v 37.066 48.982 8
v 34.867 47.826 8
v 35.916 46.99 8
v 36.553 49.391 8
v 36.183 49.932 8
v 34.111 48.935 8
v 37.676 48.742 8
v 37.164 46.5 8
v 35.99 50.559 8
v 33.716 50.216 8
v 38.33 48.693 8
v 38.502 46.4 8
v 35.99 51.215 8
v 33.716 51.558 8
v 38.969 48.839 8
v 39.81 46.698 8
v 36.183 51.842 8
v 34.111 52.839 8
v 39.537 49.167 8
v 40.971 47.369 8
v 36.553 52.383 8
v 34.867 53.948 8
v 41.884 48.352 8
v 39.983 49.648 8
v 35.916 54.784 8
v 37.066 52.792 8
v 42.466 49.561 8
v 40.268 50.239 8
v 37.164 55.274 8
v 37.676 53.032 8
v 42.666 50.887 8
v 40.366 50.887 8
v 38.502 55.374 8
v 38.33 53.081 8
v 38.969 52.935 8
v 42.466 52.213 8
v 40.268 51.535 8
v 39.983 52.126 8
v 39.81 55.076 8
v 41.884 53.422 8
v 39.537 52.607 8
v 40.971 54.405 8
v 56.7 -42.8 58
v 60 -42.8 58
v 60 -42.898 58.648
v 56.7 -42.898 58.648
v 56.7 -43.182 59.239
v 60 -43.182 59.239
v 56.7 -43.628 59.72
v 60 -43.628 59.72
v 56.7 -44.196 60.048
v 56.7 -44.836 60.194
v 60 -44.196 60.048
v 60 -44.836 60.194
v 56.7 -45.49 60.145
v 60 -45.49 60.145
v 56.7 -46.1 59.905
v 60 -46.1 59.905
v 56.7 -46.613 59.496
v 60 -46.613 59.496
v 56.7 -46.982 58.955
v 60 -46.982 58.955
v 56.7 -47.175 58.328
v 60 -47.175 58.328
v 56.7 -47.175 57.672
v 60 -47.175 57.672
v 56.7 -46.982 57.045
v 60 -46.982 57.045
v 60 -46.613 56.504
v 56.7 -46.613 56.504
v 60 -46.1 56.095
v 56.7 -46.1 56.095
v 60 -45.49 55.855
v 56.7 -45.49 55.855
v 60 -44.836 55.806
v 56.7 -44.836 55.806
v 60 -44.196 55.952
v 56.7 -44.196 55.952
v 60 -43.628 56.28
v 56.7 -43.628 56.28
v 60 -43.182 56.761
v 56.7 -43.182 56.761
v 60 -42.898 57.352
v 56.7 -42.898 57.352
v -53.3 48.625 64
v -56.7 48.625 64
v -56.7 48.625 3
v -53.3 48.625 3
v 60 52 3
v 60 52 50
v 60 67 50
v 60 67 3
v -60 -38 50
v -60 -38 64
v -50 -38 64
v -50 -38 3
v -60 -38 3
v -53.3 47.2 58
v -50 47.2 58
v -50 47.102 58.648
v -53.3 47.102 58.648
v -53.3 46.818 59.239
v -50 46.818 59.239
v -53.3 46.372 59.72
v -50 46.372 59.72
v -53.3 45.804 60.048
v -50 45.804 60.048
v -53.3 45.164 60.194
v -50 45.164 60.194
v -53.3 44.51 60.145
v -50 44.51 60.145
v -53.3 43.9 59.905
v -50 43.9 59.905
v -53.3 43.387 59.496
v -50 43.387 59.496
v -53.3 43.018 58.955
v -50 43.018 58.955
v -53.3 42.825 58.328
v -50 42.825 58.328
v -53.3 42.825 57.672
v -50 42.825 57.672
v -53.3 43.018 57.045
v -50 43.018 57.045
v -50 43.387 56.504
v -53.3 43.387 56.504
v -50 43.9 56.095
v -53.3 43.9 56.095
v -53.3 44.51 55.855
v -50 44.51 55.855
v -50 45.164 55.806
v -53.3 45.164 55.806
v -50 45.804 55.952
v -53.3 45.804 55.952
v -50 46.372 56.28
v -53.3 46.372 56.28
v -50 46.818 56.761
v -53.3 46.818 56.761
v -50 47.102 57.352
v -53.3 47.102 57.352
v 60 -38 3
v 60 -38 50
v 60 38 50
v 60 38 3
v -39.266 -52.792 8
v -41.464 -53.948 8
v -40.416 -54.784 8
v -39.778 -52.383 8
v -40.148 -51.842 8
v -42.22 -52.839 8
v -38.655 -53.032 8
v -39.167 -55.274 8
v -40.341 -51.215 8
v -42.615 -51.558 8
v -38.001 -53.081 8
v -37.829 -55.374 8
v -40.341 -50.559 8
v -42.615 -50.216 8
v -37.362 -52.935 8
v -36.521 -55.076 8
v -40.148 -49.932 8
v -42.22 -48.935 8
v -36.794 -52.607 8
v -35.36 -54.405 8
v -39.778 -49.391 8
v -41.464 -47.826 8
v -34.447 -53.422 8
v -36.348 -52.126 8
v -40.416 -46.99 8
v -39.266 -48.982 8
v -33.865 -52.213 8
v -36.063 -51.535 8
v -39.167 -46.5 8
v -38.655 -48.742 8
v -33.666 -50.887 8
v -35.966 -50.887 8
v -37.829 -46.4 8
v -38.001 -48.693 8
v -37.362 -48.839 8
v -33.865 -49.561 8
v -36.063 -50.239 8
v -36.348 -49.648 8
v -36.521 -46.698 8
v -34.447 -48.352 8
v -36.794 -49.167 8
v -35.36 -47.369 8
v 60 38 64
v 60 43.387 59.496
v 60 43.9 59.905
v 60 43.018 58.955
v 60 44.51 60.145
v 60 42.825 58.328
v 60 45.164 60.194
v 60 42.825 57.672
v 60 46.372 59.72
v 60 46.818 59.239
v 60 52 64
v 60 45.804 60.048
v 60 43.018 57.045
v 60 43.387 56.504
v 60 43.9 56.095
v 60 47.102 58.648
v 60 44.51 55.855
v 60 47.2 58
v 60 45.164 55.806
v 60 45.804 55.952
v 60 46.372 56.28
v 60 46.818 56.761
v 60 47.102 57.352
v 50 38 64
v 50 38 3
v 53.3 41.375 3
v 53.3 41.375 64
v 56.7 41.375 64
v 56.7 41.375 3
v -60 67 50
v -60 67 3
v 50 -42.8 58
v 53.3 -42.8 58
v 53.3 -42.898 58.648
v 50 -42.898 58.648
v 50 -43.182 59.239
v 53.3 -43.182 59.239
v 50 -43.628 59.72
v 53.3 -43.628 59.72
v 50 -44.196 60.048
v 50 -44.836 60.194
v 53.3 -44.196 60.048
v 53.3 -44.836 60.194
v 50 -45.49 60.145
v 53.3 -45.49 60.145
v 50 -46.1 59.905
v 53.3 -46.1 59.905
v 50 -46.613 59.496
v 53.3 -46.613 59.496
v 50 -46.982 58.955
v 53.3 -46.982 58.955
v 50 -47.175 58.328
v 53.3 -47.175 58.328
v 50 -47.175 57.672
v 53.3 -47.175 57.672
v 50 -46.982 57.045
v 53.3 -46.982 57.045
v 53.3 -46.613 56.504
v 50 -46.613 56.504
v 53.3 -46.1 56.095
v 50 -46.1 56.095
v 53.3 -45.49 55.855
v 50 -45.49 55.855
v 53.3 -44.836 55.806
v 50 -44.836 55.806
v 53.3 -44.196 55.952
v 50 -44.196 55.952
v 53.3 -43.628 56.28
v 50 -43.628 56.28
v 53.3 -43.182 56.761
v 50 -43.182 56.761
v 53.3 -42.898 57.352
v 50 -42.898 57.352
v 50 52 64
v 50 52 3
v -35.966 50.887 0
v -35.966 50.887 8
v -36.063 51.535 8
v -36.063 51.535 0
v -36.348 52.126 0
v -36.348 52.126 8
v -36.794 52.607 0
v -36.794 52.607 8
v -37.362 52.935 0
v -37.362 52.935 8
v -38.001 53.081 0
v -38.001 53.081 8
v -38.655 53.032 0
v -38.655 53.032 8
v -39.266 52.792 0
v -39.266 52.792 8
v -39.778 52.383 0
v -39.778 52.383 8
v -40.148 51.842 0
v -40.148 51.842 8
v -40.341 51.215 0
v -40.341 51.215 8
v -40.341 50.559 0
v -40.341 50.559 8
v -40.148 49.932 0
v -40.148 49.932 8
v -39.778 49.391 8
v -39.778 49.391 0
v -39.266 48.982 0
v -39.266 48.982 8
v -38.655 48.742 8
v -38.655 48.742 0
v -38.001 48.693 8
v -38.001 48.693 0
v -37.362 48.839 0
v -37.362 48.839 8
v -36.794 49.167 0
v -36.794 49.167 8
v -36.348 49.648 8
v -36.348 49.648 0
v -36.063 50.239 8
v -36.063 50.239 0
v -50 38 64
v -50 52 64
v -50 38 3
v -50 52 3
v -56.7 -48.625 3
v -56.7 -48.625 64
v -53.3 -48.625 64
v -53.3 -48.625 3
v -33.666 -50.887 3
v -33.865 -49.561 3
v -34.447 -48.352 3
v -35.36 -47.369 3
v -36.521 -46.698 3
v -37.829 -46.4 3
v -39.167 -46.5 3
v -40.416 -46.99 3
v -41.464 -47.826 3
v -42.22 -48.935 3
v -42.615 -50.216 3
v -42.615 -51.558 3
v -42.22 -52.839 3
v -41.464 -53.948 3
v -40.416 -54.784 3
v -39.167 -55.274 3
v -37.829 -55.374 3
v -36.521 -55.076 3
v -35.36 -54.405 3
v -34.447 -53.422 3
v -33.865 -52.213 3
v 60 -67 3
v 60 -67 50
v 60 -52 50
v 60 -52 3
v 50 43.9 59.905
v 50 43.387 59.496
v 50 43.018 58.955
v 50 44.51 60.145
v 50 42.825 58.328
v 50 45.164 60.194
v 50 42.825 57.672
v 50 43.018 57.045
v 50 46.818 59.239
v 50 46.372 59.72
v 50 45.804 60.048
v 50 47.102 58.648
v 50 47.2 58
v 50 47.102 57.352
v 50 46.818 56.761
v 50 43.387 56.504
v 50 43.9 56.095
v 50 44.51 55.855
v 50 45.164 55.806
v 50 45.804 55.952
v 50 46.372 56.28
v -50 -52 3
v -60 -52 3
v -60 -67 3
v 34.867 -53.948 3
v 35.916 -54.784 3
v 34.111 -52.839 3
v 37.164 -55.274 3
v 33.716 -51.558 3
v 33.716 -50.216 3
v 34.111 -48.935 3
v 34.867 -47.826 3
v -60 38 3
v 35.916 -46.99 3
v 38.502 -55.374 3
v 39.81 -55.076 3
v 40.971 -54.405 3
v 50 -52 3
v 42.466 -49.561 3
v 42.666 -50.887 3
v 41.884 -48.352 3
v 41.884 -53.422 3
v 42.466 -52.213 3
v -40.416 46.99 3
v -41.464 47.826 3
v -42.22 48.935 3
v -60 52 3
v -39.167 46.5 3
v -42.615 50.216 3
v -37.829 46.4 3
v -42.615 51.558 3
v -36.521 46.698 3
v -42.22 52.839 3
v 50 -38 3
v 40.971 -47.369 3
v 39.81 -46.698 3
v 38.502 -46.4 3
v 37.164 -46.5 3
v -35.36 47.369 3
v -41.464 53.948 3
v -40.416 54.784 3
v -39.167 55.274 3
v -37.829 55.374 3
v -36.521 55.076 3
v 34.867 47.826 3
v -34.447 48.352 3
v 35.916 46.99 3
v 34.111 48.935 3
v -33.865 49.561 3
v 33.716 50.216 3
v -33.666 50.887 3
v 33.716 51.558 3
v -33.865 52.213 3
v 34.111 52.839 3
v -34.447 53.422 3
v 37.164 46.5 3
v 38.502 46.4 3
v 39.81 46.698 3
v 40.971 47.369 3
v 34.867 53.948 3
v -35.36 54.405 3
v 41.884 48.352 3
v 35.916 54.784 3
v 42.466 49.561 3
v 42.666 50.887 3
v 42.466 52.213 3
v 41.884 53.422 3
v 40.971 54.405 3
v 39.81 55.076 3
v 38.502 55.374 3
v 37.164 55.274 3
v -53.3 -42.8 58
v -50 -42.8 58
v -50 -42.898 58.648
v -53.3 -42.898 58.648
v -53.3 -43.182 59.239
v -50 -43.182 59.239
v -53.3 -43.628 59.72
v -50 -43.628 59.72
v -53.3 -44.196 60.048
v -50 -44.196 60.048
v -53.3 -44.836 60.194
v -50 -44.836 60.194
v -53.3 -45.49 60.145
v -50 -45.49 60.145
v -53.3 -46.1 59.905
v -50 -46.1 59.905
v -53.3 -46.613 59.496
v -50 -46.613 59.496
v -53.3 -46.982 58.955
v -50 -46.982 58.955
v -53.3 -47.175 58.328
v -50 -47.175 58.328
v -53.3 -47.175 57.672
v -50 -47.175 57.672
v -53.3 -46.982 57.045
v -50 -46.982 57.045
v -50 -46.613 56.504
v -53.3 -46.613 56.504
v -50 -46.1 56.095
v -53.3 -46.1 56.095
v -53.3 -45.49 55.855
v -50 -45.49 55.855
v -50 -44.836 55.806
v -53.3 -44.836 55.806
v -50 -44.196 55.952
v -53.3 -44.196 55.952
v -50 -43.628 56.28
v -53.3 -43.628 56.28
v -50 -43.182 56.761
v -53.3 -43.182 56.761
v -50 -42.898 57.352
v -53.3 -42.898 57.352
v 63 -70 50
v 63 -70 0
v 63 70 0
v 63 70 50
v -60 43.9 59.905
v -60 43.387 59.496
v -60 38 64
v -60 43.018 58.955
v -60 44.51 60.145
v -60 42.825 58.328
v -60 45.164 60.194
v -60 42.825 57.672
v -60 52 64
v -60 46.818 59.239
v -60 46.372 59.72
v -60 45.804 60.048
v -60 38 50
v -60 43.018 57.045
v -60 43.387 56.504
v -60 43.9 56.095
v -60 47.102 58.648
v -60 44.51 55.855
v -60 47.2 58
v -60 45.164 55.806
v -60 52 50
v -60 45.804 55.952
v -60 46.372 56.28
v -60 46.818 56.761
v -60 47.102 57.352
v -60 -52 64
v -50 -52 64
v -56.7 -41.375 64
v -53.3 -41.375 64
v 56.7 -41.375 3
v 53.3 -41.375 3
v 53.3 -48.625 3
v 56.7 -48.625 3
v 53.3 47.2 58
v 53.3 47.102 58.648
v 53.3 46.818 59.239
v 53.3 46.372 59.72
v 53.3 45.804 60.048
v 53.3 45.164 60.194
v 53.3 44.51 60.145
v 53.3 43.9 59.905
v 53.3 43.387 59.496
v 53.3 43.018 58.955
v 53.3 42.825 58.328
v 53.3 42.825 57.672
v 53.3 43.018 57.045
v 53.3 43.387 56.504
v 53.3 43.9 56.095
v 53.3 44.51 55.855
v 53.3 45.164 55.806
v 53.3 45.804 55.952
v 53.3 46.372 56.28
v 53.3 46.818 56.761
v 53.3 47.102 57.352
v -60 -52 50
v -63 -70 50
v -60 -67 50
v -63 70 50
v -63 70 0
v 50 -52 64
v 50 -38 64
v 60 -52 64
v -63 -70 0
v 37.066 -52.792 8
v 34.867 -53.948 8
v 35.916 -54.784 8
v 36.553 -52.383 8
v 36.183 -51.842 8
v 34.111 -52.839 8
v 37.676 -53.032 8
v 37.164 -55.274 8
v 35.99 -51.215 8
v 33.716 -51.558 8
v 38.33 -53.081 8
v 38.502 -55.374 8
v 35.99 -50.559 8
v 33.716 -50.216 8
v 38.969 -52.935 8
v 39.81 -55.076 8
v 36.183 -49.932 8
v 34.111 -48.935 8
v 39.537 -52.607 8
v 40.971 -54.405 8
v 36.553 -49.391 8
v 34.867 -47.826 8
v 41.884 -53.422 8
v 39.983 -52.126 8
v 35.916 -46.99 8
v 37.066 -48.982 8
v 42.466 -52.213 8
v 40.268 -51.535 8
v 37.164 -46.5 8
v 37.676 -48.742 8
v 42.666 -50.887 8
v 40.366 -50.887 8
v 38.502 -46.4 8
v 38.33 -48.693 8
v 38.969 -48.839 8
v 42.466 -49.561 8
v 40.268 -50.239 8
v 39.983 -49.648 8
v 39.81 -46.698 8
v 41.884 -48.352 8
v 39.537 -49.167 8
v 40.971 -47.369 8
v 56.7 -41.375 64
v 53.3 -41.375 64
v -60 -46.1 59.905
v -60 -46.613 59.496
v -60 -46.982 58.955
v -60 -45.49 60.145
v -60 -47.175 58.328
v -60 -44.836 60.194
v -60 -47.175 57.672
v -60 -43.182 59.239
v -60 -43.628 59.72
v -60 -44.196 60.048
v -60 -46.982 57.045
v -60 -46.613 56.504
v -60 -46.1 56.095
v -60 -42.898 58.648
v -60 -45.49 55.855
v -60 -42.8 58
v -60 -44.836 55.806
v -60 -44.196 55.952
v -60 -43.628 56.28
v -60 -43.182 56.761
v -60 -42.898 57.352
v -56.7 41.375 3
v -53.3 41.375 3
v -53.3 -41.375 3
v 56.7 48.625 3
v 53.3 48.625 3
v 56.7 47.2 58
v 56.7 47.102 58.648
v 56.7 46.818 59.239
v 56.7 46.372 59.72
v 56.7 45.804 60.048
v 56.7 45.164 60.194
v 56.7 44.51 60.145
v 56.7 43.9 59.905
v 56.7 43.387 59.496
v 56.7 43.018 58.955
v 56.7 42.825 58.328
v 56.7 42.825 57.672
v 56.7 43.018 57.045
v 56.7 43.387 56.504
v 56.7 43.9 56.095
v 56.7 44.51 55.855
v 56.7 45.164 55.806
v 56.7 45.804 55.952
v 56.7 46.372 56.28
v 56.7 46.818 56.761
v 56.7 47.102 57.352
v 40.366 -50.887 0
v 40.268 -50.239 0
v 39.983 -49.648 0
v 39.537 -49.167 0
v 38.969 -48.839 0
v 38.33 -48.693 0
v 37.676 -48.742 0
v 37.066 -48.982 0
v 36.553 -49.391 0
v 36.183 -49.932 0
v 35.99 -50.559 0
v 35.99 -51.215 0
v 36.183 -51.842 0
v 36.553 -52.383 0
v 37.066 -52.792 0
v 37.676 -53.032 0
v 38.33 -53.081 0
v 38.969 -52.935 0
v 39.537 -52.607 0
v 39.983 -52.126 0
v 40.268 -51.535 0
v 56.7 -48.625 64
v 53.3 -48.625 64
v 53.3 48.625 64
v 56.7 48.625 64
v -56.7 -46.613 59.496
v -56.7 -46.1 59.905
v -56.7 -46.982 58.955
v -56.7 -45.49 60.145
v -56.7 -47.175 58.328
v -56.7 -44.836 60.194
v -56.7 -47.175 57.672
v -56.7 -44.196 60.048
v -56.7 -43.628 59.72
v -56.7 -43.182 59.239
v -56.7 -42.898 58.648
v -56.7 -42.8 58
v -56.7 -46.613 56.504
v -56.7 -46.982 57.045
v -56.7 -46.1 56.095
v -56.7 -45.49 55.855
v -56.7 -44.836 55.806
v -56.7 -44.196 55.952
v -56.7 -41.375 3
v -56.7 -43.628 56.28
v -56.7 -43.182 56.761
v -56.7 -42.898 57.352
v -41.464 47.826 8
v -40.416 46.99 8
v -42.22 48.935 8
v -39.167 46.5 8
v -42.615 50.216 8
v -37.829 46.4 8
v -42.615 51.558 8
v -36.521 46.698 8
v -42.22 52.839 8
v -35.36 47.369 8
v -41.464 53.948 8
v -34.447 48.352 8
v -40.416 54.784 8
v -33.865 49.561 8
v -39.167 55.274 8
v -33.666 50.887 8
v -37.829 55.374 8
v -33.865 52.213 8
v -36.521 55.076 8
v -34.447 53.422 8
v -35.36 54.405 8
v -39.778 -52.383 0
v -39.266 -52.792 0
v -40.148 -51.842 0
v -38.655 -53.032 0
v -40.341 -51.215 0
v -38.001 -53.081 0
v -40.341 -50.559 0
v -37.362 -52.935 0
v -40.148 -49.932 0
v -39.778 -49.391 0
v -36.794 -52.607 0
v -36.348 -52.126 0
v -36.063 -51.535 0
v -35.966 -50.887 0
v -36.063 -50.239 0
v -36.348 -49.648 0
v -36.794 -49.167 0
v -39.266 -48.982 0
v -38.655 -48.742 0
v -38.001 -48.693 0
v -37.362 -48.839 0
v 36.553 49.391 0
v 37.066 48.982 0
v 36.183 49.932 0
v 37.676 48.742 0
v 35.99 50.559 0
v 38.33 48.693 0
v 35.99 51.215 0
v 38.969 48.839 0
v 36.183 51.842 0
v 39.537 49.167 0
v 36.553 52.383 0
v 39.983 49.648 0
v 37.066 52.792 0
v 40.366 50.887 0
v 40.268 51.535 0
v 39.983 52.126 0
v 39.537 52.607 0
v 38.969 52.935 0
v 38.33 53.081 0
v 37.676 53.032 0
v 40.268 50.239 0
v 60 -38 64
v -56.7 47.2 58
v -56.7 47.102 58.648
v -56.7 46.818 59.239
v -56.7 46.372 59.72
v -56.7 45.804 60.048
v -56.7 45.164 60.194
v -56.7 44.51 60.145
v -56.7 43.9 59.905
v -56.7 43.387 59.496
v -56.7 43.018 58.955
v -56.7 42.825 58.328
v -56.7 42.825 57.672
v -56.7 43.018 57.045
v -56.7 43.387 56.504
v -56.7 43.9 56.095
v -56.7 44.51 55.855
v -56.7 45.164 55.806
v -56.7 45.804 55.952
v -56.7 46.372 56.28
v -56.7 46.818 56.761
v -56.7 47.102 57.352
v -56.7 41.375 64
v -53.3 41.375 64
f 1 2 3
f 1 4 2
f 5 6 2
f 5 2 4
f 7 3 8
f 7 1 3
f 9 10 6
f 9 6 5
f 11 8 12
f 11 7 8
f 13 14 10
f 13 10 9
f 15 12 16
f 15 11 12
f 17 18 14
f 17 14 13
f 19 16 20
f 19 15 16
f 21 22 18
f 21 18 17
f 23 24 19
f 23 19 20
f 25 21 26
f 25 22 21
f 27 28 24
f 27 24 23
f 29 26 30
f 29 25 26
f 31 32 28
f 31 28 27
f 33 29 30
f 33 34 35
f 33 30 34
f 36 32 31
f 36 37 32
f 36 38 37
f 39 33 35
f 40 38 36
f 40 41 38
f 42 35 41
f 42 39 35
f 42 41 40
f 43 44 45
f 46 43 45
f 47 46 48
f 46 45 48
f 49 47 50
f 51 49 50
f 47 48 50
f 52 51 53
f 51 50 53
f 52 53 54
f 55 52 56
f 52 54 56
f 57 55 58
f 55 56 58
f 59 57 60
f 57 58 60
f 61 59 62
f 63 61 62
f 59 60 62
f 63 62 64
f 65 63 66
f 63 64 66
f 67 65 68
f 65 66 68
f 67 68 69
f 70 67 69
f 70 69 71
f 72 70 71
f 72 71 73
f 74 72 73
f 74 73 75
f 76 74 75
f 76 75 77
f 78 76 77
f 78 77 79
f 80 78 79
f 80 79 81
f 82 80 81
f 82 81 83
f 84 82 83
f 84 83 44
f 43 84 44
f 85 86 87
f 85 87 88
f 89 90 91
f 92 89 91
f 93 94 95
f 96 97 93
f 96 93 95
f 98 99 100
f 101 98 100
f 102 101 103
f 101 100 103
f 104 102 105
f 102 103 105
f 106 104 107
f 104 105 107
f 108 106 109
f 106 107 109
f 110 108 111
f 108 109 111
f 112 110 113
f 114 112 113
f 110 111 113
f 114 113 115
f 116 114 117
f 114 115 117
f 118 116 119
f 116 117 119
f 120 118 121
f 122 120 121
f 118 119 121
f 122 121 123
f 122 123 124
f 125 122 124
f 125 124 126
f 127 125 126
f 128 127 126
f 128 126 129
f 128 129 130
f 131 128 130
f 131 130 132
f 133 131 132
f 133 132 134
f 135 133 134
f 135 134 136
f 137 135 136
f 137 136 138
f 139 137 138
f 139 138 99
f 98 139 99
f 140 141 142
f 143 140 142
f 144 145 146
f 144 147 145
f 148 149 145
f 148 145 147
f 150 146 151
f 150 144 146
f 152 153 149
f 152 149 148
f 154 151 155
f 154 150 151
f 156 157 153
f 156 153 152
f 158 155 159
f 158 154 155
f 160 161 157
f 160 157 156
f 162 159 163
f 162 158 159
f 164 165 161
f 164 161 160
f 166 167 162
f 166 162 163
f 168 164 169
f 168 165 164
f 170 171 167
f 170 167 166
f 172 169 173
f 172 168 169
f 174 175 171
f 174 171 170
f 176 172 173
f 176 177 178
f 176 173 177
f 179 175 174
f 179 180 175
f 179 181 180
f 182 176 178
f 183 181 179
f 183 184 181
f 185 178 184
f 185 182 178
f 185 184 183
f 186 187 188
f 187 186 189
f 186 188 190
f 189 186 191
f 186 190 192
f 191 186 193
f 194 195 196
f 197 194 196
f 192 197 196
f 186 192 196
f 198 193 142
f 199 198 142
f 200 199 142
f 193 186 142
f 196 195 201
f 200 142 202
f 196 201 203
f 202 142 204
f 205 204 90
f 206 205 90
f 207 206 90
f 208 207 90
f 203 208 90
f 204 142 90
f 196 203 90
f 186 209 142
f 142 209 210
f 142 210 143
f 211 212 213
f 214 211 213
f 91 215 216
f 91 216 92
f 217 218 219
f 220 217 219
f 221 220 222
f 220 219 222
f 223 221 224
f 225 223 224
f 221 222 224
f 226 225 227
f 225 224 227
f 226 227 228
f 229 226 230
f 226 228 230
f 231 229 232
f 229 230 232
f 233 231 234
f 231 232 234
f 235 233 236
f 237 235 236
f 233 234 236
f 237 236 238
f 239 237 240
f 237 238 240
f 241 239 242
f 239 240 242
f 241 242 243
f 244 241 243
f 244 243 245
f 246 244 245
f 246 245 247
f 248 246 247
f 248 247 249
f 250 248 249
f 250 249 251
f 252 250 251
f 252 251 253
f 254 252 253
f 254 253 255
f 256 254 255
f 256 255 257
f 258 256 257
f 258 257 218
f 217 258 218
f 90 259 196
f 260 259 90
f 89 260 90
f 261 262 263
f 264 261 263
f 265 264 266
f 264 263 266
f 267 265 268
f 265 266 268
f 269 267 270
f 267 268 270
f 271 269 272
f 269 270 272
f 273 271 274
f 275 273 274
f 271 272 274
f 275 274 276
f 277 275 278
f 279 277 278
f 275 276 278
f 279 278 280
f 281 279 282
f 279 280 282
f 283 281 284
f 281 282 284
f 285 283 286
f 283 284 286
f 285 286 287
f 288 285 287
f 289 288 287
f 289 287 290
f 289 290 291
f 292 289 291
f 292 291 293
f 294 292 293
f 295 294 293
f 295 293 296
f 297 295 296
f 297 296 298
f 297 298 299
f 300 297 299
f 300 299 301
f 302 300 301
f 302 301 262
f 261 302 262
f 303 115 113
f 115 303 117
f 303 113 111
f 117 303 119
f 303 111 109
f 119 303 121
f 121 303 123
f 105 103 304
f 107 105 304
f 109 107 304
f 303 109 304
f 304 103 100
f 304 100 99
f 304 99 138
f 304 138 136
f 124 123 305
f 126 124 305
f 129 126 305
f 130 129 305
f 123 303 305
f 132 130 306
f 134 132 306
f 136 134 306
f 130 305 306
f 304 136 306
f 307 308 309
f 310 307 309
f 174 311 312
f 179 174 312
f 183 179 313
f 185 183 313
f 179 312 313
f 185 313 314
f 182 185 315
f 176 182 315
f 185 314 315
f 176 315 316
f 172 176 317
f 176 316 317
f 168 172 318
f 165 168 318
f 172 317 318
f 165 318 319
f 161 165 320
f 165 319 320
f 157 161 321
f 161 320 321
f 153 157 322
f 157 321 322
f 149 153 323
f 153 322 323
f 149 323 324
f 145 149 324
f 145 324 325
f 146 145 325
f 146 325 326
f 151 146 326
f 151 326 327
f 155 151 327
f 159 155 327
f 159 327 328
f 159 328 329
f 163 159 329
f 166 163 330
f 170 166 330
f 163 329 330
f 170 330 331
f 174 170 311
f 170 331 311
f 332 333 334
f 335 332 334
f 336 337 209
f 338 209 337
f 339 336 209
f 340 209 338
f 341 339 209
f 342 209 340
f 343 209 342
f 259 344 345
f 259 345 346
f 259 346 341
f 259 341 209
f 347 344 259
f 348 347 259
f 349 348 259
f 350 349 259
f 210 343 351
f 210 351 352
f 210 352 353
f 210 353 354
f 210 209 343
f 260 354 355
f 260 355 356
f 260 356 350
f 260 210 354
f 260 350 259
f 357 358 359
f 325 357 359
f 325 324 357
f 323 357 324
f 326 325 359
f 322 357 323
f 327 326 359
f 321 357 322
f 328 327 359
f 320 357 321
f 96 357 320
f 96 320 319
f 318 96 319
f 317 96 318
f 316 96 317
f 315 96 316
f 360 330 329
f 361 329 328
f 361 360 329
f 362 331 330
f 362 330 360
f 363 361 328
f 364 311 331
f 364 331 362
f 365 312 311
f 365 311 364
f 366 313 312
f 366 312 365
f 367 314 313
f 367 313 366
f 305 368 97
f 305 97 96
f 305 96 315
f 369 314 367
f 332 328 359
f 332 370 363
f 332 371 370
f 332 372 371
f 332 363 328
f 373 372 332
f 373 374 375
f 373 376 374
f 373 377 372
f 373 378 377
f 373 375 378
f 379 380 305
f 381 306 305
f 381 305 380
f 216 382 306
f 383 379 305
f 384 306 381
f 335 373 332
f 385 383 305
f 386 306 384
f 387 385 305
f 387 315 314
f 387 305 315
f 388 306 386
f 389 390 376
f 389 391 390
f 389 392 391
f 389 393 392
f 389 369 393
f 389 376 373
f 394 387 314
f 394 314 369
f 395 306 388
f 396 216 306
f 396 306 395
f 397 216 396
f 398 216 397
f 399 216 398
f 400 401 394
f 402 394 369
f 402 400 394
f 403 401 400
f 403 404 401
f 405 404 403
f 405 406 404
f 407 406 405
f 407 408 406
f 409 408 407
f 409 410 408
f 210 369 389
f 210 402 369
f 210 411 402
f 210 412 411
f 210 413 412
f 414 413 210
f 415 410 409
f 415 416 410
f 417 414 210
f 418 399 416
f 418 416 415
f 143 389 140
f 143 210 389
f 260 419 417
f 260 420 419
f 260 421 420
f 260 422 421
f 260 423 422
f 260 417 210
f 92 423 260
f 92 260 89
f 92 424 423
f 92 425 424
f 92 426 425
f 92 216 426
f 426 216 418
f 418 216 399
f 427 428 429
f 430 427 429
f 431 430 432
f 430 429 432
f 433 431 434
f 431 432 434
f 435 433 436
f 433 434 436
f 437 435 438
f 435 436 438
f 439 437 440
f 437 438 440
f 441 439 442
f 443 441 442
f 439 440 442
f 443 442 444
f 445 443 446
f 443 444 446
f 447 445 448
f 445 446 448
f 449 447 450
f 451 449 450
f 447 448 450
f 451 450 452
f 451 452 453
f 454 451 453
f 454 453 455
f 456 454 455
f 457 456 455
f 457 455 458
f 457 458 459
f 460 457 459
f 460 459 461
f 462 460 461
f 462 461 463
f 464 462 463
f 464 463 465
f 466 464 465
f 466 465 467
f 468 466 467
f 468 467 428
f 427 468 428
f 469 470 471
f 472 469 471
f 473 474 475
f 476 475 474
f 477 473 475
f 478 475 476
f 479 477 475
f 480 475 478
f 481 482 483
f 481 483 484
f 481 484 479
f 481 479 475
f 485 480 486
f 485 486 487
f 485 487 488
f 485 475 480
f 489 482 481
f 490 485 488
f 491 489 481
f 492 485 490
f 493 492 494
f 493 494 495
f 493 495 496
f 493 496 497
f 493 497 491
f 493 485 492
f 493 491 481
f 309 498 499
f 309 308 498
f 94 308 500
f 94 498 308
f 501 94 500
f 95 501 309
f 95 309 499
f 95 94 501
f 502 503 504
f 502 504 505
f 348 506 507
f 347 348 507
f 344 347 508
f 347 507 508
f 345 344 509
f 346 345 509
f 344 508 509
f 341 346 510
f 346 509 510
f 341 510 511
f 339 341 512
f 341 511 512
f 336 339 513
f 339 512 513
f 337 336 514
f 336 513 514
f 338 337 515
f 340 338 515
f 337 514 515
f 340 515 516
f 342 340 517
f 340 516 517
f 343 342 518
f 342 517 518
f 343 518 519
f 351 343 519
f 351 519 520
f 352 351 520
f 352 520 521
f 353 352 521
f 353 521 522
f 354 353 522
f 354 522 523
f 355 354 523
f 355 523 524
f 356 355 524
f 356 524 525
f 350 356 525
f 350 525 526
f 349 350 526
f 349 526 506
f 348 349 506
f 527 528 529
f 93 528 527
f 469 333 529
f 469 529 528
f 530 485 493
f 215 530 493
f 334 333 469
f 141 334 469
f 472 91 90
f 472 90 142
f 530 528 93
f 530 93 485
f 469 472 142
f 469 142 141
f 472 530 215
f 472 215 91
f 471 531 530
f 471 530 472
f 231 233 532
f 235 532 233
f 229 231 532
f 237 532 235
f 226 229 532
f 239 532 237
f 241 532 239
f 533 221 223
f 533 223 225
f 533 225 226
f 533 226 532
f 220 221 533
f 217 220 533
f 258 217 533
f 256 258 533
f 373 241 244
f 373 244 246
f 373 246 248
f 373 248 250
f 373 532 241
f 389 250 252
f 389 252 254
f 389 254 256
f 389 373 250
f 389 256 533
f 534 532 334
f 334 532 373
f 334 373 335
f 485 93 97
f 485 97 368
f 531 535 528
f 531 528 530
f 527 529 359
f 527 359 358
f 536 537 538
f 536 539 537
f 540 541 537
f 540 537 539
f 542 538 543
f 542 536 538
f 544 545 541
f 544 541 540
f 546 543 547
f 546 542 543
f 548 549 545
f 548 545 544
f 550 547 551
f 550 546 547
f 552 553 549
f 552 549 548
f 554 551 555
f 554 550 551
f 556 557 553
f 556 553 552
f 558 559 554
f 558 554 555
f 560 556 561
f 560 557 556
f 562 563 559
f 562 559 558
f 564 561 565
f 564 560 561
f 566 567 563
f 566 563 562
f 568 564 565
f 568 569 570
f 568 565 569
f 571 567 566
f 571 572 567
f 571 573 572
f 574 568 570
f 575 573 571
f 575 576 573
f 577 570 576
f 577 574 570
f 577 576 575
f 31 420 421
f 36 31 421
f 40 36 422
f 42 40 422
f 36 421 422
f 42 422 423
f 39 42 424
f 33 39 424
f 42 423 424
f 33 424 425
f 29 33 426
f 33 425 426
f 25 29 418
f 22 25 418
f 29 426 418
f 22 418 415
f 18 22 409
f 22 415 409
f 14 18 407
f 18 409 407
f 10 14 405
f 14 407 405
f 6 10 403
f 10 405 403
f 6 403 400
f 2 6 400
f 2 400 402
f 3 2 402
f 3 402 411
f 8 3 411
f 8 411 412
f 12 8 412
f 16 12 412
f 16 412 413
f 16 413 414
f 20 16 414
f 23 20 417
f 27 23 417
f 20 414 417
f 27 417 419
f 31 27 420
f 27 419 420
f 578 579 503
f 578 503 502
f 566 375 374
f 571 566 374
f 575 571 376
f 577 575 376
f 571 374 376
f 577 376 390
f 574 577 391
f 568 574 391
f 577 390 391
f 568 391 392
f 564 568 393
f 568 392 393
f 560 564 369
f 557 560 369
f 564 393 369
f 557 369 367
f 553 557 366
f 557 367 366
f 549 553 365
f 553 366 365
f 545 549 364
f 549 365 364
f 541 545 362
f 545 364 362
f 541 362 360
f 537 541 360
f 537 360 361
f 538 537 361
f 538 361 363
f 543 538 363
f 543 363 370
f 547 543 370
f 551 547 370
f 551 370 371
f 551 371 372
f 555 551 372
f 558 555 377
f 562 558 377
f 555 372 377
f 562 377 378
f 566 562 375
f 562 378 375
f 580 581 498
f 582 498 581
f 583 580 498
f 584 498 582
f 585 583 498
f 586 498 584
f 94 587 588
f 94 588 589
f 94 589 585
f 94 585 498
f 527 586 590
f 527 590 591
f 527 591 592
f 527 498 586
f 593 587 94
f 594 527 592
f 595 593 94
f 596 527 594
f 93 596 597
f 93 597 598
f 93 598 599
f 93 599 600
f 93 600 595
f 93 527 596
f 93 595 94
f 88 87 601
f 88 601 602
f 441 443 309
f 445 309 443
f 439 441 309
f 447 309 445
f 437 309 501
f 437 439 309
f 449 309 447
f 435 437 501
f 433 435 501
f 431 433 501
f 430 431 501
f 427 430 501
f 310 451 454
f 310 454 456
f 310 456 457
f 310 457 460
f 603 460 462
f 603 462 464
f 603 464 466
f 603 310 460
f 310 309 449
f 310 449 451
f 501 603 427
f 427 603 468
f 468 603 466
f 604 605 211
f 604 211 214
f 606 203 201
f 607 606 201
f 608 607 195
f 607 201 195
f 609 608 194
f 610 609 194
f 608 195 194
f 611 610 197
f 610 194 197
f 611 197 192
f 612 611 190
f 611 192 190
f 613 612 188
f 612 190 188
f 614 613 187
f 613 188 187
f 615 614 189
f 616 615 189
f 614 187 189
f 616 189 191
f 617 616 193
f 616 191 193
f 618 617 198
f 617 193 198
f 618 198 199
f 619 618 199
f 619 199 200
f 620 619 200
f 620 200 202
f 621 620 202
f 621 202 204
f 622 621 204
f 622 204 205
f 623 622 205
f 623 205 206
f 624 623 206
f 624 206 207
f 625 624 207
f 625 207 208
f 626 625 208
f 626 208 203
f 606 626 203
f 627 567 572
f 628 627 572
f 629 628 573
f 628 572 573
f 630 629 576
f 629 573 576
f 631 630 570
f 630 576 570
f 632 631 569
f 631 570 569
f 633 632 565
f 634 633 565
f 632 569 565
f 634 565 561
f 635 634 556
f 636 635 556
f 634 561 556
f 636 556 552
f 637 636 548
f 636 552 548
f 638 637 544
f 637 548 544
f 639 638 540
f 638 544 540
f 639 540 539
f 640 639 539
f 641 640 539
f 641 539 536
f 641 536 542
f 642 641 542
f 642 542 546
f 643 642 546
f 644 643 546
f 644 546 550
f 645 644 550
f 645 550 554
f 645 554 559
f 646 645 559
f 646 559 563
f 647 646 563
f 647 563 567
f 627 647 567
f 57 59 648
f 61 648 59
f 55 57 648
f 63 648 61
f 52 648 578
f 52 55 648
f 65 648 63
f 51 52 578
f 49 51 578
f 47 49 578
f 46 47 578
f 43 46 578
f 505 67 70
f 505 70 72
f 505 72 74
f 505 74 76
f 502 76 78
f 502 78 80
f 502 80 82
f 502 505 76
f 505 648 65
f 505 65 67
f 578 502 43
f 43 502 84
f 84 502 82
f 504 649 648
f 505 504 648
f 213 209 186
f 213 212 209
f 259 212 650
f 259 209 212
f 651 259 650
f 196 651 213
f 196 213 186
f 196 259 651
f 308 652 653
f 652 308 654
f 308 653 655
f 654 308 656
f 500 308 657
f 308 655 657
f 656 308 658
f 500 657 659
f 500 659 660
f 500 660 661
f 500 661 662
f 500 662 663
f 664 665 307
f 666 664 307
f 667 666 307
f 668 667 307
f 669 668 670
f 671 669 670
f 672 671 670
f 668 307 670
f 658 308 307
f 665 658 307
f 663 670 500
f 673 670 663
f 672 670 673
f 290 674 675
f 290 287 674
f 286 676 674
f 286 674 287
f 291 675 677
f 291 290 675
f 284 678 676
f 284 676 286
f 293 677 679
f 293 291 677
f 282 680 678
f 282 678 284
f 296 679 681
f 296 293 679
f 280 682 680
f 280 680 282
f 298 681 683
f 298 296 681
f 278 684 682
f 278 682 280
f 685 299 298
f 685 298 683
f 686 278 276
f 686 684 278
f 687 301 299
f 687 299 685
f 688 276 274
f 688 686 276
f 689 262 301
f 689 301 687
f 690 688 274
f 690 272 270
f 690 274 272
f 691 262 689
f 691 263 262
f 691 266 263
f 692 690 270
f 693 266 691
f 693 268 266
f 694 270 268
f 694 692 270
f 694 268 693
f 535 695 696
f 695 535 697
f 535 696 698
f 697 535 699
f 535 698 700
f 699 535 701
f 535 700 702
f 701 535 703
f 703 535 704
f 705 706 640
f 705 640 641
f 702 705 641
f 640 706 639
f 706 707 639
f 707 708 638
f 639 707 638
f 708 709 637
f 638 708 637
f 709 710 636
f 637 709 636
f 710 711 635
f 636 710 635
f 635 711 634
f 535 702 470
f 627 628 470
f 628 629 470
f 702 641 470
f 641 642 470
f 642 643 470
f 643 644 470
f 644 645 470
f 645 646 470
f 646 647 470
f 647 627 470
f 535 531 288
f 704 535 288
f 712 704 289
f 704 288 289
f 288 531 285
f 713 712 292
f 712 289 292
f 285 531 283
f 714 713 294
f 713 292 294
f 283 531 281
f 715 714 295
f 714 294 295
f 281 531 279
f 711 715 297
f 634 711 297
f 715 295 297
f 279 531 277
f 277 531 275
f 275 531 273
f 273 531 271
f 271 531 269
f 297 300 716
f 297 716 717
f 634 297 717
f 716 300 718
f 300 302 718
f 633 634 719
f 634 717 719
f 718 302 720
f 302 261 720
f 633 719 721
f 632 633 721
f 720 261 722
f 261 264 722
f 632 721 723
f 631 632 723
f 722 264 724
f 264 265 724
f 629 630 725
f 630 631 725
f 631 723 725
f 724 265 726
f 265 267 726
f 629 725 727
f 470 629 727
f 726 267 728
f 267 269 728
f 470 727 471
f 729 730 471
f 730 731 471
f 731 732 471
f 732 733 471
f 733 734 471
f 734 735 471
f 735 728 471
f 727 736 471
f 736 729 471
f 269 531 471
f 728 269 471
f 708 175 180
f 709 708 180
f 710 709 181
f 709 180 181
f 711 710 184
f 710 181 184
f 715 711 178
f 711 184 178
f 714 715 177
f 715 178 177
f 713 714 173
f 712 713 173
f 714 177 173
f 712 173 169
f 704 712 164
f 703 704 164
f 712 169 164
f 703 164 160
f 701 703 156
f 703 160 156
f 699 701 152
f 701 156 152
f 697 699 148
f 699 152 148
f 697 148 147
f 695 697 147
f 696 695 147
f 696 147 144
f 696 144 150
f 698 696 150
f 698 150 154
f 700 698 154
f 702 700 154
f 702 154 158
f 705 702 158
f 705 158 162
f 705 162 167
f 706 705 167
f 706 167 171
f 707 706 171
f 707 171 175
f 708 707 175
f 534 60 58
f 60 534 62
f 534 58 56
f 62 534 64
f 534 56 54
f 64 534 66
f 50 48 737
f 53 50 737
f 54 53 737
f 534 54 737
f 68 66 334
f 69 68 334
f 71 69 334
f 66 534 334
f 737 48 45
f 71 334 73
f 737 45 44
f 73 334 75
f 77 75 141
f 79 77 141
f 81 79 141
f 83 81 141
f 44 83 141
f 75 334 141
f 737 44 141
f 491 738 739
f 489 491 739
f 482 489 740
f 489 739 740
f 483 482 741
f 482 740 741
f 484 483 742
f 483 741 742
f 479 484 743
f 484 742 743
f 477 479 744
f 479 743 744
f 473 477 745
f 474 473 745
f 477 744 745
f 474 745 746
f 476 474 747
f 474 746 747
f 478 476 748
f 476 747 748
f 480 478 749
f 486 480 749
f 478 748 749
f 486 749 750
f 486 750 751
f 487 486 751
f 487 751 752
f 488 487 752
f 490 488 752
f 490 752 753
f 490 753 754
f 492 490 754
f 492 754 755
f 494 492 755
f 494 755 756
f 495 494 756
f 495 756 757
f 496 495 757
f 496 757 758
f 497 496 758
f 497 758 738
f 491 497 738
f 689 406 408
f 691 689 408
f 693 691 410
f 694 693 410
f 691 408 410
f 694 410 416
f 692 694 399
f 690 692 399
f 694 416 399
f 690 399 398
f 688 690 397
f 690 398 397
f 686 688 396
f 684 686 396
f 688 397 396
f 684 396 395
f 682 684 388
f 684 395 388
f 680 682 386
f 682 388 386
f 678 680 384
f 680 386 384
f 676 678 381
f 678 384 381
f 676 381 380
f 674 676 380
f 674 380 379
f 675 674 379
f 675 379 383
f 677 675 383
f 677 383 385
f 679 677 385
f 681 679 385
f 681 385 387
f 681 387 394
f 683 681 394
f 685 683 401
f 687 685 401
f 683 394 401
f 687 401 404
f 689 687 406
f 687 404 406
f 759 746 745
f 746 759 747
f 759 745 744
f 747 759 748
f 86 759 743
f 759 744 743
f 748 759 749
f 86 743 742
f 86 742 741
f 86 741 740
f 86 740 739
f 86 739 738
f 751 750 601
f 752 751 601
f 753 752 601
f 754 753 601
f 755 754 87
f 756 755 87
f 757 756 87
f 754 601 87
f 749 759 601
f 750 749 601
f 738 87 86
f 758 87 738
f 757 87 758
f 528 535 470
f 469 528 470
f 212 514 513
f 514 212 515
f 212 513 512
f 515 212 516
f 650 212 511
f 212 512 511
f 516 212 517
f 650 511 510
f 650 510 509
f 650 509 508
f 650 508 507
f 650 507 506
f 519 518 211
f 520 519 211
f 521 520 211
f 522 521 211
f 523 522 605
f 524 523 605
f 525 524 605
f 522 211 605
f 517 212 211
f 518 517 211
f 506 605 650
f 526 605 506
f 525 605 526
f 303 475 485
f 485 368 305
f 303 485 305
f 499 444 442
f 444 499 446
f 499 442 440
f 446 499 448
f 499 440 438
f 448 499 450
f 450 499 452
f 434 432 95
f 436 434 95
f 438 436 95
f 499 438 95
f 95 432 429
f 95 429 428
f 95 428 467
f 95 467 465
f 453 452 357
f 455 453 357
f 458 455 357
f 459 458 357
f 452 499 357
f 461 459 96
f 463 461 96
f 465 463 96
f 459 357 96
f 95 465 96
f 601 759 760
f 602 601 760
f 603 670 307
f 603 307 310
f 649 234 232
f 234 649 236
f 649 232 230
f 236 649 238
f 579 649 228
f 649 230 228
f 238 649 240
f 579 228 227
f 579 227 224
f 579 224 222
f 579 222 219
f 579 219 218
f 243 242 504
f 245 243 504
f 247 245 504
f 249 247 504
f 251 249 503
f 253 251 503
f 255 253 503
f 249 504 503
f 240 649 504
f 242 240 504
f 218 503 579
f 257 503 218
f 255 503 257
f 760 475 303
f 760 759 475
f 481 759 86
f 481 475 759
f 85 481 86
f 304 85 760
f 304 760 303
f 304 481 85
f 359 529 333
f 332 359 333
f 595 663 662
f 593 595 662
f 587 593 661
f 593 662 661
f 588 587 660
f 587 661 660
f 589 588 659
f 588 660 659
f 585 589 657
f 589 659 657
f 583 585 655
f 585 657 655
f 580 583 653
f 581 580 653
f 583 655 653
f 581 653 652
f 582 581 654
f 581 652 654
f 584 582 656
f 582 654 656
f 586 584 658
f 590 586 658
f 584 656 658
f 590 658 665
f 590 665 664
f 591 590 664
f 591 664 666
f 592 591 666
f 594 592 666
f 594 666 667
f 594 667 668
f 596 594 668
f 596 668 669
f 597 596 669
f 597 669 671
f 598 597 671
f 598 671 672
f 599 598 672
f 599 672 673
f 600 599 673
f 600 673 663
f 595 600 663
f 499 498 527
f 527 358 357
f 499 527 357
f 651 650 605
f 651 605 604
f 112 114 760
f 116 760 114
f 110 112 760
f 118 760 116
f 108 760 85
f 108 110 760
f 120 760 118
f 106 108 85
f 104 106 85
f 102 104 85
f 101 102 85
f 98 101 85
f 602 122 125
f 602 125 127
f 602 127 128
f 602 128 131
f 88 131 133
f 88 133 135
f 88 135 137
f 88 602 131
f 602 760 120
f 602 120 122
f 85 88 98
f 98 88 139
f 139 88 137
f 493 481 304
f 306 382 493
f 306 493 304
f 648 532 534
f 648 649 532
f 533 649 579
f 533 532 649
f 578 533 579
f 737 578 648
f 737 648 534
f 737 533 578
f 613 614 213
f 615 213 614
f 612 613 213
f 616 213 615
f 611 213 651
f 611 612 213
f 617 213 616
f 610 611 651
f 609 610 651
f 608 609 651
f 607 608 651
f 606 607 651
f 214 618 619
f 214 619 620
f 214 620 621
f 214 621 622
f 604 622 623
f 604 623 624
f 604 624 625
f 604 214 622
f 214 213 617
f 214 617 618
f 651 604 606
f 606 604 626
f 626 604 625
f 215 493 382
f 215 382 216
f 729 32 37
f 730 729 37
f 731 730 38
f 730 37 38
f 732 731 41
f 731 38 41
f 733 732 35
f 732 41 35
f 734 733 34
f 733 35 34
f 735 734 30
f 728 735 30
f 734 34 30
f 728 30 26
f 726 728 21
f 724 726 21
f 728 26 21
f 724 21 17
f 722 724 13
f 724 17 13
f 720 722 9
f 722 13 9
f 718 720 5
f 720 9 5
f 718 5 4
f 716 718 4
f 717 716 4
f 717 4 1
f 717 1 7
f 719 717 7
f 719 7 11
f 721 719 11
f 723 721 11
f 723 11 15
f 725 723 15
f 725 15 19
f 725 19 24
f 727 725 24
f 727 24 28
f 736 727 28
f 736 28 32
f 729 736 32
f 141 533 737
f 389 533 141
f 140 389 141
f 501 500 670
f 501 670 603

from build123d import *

# Parameters (mm, degrees)
SKETCH_W        = 126
SKETCH_H        = 140
PAD_DEPTH       = 50
SKETCH002_W     = 120
SKETCH002_H     = 134
POCKET_DEPTH    = 47
SKETCH001_W     = 10
SKETCH001_H     = 14
SKETCH001_W_2   = 3.4
SKETCH001_H_2   = 7.25
PAD001_DEPTH    = 61
SKETCH003_R     = 2.2
POCKET001_DEPTH = 123.001
SKETCH004_R     = 4.5
PAD002_DEPTH    = 5
SKETCH005_R     = 2.2
POCKET002_DEPTH = 8.001


with BuildPart() as part:
    # Sketch → Pad (new body)
    with BuildSketch(Plane.XY):
        Rectangle(SKETCH_W, SKETCH_H)
    extrude(amount=PAD_DEPTH)

    # Sketch002 → Pocket (cut)
    with BuildSketch(Plane.XY.offset(50)):
        Rectangle(SKETCH002_W, SKETCH002_H)
    extrude(amount=-POCKET_DEPTH, mode=Mode.SUBTRACT)

    # Sketch001 → Pad001 (new body)
    with BuildSketch(Plane.XY.offset(3)):
        with Locations((-55, 45)):
            Rectangle(SKETCH001_W, SKETCH001_H)
        with Locations((-55, 45)):
            Rectangle(SKETCH001_W_2, SKETCH001_H_2, mode=Mode.SUBTRACT)
        with Locations((55, 45)):
            Rectangle(SKETCH001_W, SKETCH001_H)
        with Locations((55, 45)):
            Rectangle(SKETCH001_W_2, SKETCH001_H_2, mode=Mode.SUBTRACT)
        with Locations((-55, -45)):
            Rectangle(SKETCH001_W, SKETCH001_H)
        with Locations((-55, -45)):
            Rectangle(SKETCH001_W_2, SKETCH001_H_2, mode=Mode.SUBTRACT)
        with Locations((55, -45)):
            Rectangle(SKETCH001_W, SKETCH001_H)
        with Locations((55, -45)):
            Rectangle(SKETCH001_W_2, SKETCH001_H_2, mode=Mode.SUBTRACT)
    extrude(amount=PAD001_DEPTH)

    # Sketch003 → Pocket001 (cut, through all)
    with BuildSketch(Plane.YZ.offset(60)):
        with Locations((-45, 58)):
            Circle(SKETCH003_R)
        with Locations((45, 58)):
            Circle(SKETCH003_R)
    extrude(amount=-POCKET001_DEPTH, mode=Mode.SUBTRACT)

    # Sketch004 → Pad002 (new body)
    with BuildSketch(Plane.XY.offset(3)):
        with Locations((-38.1655, 50.887)):
            Circle(SKETCH004_R)
        with Locations((38.1655, 50.887)):
            Circle(SKETCH004_R)
        with Locations((-38.1655, -50.887)):
            Circle(SKETCH004_R)
        with Locations((38.1655, -50.887)):
            Circle(SKETCH004_R)
    extrude(amount=PAD002_DEPTH)

    # Sketch005 → Pocket002 (cut, through all)
    with BuildSketch(Plane.XY.offset(8)):
        with Locations((-38.1655, 50.887)):
            Circle(SKETCH005_R)
        with Locations((38.1655, 50.887)):
            Circle(SKETCH005_R)
        with Locations((-38.1655, -50.887)):
            Circle(SKETCH005_R)
        with Locations((38.1655, -50.887)):
            Circle(SKETCH005_R)
    extrude(amount=-POCKET002_DEPTH, mode=Mode.SUBTRACT)


solid = part.part
